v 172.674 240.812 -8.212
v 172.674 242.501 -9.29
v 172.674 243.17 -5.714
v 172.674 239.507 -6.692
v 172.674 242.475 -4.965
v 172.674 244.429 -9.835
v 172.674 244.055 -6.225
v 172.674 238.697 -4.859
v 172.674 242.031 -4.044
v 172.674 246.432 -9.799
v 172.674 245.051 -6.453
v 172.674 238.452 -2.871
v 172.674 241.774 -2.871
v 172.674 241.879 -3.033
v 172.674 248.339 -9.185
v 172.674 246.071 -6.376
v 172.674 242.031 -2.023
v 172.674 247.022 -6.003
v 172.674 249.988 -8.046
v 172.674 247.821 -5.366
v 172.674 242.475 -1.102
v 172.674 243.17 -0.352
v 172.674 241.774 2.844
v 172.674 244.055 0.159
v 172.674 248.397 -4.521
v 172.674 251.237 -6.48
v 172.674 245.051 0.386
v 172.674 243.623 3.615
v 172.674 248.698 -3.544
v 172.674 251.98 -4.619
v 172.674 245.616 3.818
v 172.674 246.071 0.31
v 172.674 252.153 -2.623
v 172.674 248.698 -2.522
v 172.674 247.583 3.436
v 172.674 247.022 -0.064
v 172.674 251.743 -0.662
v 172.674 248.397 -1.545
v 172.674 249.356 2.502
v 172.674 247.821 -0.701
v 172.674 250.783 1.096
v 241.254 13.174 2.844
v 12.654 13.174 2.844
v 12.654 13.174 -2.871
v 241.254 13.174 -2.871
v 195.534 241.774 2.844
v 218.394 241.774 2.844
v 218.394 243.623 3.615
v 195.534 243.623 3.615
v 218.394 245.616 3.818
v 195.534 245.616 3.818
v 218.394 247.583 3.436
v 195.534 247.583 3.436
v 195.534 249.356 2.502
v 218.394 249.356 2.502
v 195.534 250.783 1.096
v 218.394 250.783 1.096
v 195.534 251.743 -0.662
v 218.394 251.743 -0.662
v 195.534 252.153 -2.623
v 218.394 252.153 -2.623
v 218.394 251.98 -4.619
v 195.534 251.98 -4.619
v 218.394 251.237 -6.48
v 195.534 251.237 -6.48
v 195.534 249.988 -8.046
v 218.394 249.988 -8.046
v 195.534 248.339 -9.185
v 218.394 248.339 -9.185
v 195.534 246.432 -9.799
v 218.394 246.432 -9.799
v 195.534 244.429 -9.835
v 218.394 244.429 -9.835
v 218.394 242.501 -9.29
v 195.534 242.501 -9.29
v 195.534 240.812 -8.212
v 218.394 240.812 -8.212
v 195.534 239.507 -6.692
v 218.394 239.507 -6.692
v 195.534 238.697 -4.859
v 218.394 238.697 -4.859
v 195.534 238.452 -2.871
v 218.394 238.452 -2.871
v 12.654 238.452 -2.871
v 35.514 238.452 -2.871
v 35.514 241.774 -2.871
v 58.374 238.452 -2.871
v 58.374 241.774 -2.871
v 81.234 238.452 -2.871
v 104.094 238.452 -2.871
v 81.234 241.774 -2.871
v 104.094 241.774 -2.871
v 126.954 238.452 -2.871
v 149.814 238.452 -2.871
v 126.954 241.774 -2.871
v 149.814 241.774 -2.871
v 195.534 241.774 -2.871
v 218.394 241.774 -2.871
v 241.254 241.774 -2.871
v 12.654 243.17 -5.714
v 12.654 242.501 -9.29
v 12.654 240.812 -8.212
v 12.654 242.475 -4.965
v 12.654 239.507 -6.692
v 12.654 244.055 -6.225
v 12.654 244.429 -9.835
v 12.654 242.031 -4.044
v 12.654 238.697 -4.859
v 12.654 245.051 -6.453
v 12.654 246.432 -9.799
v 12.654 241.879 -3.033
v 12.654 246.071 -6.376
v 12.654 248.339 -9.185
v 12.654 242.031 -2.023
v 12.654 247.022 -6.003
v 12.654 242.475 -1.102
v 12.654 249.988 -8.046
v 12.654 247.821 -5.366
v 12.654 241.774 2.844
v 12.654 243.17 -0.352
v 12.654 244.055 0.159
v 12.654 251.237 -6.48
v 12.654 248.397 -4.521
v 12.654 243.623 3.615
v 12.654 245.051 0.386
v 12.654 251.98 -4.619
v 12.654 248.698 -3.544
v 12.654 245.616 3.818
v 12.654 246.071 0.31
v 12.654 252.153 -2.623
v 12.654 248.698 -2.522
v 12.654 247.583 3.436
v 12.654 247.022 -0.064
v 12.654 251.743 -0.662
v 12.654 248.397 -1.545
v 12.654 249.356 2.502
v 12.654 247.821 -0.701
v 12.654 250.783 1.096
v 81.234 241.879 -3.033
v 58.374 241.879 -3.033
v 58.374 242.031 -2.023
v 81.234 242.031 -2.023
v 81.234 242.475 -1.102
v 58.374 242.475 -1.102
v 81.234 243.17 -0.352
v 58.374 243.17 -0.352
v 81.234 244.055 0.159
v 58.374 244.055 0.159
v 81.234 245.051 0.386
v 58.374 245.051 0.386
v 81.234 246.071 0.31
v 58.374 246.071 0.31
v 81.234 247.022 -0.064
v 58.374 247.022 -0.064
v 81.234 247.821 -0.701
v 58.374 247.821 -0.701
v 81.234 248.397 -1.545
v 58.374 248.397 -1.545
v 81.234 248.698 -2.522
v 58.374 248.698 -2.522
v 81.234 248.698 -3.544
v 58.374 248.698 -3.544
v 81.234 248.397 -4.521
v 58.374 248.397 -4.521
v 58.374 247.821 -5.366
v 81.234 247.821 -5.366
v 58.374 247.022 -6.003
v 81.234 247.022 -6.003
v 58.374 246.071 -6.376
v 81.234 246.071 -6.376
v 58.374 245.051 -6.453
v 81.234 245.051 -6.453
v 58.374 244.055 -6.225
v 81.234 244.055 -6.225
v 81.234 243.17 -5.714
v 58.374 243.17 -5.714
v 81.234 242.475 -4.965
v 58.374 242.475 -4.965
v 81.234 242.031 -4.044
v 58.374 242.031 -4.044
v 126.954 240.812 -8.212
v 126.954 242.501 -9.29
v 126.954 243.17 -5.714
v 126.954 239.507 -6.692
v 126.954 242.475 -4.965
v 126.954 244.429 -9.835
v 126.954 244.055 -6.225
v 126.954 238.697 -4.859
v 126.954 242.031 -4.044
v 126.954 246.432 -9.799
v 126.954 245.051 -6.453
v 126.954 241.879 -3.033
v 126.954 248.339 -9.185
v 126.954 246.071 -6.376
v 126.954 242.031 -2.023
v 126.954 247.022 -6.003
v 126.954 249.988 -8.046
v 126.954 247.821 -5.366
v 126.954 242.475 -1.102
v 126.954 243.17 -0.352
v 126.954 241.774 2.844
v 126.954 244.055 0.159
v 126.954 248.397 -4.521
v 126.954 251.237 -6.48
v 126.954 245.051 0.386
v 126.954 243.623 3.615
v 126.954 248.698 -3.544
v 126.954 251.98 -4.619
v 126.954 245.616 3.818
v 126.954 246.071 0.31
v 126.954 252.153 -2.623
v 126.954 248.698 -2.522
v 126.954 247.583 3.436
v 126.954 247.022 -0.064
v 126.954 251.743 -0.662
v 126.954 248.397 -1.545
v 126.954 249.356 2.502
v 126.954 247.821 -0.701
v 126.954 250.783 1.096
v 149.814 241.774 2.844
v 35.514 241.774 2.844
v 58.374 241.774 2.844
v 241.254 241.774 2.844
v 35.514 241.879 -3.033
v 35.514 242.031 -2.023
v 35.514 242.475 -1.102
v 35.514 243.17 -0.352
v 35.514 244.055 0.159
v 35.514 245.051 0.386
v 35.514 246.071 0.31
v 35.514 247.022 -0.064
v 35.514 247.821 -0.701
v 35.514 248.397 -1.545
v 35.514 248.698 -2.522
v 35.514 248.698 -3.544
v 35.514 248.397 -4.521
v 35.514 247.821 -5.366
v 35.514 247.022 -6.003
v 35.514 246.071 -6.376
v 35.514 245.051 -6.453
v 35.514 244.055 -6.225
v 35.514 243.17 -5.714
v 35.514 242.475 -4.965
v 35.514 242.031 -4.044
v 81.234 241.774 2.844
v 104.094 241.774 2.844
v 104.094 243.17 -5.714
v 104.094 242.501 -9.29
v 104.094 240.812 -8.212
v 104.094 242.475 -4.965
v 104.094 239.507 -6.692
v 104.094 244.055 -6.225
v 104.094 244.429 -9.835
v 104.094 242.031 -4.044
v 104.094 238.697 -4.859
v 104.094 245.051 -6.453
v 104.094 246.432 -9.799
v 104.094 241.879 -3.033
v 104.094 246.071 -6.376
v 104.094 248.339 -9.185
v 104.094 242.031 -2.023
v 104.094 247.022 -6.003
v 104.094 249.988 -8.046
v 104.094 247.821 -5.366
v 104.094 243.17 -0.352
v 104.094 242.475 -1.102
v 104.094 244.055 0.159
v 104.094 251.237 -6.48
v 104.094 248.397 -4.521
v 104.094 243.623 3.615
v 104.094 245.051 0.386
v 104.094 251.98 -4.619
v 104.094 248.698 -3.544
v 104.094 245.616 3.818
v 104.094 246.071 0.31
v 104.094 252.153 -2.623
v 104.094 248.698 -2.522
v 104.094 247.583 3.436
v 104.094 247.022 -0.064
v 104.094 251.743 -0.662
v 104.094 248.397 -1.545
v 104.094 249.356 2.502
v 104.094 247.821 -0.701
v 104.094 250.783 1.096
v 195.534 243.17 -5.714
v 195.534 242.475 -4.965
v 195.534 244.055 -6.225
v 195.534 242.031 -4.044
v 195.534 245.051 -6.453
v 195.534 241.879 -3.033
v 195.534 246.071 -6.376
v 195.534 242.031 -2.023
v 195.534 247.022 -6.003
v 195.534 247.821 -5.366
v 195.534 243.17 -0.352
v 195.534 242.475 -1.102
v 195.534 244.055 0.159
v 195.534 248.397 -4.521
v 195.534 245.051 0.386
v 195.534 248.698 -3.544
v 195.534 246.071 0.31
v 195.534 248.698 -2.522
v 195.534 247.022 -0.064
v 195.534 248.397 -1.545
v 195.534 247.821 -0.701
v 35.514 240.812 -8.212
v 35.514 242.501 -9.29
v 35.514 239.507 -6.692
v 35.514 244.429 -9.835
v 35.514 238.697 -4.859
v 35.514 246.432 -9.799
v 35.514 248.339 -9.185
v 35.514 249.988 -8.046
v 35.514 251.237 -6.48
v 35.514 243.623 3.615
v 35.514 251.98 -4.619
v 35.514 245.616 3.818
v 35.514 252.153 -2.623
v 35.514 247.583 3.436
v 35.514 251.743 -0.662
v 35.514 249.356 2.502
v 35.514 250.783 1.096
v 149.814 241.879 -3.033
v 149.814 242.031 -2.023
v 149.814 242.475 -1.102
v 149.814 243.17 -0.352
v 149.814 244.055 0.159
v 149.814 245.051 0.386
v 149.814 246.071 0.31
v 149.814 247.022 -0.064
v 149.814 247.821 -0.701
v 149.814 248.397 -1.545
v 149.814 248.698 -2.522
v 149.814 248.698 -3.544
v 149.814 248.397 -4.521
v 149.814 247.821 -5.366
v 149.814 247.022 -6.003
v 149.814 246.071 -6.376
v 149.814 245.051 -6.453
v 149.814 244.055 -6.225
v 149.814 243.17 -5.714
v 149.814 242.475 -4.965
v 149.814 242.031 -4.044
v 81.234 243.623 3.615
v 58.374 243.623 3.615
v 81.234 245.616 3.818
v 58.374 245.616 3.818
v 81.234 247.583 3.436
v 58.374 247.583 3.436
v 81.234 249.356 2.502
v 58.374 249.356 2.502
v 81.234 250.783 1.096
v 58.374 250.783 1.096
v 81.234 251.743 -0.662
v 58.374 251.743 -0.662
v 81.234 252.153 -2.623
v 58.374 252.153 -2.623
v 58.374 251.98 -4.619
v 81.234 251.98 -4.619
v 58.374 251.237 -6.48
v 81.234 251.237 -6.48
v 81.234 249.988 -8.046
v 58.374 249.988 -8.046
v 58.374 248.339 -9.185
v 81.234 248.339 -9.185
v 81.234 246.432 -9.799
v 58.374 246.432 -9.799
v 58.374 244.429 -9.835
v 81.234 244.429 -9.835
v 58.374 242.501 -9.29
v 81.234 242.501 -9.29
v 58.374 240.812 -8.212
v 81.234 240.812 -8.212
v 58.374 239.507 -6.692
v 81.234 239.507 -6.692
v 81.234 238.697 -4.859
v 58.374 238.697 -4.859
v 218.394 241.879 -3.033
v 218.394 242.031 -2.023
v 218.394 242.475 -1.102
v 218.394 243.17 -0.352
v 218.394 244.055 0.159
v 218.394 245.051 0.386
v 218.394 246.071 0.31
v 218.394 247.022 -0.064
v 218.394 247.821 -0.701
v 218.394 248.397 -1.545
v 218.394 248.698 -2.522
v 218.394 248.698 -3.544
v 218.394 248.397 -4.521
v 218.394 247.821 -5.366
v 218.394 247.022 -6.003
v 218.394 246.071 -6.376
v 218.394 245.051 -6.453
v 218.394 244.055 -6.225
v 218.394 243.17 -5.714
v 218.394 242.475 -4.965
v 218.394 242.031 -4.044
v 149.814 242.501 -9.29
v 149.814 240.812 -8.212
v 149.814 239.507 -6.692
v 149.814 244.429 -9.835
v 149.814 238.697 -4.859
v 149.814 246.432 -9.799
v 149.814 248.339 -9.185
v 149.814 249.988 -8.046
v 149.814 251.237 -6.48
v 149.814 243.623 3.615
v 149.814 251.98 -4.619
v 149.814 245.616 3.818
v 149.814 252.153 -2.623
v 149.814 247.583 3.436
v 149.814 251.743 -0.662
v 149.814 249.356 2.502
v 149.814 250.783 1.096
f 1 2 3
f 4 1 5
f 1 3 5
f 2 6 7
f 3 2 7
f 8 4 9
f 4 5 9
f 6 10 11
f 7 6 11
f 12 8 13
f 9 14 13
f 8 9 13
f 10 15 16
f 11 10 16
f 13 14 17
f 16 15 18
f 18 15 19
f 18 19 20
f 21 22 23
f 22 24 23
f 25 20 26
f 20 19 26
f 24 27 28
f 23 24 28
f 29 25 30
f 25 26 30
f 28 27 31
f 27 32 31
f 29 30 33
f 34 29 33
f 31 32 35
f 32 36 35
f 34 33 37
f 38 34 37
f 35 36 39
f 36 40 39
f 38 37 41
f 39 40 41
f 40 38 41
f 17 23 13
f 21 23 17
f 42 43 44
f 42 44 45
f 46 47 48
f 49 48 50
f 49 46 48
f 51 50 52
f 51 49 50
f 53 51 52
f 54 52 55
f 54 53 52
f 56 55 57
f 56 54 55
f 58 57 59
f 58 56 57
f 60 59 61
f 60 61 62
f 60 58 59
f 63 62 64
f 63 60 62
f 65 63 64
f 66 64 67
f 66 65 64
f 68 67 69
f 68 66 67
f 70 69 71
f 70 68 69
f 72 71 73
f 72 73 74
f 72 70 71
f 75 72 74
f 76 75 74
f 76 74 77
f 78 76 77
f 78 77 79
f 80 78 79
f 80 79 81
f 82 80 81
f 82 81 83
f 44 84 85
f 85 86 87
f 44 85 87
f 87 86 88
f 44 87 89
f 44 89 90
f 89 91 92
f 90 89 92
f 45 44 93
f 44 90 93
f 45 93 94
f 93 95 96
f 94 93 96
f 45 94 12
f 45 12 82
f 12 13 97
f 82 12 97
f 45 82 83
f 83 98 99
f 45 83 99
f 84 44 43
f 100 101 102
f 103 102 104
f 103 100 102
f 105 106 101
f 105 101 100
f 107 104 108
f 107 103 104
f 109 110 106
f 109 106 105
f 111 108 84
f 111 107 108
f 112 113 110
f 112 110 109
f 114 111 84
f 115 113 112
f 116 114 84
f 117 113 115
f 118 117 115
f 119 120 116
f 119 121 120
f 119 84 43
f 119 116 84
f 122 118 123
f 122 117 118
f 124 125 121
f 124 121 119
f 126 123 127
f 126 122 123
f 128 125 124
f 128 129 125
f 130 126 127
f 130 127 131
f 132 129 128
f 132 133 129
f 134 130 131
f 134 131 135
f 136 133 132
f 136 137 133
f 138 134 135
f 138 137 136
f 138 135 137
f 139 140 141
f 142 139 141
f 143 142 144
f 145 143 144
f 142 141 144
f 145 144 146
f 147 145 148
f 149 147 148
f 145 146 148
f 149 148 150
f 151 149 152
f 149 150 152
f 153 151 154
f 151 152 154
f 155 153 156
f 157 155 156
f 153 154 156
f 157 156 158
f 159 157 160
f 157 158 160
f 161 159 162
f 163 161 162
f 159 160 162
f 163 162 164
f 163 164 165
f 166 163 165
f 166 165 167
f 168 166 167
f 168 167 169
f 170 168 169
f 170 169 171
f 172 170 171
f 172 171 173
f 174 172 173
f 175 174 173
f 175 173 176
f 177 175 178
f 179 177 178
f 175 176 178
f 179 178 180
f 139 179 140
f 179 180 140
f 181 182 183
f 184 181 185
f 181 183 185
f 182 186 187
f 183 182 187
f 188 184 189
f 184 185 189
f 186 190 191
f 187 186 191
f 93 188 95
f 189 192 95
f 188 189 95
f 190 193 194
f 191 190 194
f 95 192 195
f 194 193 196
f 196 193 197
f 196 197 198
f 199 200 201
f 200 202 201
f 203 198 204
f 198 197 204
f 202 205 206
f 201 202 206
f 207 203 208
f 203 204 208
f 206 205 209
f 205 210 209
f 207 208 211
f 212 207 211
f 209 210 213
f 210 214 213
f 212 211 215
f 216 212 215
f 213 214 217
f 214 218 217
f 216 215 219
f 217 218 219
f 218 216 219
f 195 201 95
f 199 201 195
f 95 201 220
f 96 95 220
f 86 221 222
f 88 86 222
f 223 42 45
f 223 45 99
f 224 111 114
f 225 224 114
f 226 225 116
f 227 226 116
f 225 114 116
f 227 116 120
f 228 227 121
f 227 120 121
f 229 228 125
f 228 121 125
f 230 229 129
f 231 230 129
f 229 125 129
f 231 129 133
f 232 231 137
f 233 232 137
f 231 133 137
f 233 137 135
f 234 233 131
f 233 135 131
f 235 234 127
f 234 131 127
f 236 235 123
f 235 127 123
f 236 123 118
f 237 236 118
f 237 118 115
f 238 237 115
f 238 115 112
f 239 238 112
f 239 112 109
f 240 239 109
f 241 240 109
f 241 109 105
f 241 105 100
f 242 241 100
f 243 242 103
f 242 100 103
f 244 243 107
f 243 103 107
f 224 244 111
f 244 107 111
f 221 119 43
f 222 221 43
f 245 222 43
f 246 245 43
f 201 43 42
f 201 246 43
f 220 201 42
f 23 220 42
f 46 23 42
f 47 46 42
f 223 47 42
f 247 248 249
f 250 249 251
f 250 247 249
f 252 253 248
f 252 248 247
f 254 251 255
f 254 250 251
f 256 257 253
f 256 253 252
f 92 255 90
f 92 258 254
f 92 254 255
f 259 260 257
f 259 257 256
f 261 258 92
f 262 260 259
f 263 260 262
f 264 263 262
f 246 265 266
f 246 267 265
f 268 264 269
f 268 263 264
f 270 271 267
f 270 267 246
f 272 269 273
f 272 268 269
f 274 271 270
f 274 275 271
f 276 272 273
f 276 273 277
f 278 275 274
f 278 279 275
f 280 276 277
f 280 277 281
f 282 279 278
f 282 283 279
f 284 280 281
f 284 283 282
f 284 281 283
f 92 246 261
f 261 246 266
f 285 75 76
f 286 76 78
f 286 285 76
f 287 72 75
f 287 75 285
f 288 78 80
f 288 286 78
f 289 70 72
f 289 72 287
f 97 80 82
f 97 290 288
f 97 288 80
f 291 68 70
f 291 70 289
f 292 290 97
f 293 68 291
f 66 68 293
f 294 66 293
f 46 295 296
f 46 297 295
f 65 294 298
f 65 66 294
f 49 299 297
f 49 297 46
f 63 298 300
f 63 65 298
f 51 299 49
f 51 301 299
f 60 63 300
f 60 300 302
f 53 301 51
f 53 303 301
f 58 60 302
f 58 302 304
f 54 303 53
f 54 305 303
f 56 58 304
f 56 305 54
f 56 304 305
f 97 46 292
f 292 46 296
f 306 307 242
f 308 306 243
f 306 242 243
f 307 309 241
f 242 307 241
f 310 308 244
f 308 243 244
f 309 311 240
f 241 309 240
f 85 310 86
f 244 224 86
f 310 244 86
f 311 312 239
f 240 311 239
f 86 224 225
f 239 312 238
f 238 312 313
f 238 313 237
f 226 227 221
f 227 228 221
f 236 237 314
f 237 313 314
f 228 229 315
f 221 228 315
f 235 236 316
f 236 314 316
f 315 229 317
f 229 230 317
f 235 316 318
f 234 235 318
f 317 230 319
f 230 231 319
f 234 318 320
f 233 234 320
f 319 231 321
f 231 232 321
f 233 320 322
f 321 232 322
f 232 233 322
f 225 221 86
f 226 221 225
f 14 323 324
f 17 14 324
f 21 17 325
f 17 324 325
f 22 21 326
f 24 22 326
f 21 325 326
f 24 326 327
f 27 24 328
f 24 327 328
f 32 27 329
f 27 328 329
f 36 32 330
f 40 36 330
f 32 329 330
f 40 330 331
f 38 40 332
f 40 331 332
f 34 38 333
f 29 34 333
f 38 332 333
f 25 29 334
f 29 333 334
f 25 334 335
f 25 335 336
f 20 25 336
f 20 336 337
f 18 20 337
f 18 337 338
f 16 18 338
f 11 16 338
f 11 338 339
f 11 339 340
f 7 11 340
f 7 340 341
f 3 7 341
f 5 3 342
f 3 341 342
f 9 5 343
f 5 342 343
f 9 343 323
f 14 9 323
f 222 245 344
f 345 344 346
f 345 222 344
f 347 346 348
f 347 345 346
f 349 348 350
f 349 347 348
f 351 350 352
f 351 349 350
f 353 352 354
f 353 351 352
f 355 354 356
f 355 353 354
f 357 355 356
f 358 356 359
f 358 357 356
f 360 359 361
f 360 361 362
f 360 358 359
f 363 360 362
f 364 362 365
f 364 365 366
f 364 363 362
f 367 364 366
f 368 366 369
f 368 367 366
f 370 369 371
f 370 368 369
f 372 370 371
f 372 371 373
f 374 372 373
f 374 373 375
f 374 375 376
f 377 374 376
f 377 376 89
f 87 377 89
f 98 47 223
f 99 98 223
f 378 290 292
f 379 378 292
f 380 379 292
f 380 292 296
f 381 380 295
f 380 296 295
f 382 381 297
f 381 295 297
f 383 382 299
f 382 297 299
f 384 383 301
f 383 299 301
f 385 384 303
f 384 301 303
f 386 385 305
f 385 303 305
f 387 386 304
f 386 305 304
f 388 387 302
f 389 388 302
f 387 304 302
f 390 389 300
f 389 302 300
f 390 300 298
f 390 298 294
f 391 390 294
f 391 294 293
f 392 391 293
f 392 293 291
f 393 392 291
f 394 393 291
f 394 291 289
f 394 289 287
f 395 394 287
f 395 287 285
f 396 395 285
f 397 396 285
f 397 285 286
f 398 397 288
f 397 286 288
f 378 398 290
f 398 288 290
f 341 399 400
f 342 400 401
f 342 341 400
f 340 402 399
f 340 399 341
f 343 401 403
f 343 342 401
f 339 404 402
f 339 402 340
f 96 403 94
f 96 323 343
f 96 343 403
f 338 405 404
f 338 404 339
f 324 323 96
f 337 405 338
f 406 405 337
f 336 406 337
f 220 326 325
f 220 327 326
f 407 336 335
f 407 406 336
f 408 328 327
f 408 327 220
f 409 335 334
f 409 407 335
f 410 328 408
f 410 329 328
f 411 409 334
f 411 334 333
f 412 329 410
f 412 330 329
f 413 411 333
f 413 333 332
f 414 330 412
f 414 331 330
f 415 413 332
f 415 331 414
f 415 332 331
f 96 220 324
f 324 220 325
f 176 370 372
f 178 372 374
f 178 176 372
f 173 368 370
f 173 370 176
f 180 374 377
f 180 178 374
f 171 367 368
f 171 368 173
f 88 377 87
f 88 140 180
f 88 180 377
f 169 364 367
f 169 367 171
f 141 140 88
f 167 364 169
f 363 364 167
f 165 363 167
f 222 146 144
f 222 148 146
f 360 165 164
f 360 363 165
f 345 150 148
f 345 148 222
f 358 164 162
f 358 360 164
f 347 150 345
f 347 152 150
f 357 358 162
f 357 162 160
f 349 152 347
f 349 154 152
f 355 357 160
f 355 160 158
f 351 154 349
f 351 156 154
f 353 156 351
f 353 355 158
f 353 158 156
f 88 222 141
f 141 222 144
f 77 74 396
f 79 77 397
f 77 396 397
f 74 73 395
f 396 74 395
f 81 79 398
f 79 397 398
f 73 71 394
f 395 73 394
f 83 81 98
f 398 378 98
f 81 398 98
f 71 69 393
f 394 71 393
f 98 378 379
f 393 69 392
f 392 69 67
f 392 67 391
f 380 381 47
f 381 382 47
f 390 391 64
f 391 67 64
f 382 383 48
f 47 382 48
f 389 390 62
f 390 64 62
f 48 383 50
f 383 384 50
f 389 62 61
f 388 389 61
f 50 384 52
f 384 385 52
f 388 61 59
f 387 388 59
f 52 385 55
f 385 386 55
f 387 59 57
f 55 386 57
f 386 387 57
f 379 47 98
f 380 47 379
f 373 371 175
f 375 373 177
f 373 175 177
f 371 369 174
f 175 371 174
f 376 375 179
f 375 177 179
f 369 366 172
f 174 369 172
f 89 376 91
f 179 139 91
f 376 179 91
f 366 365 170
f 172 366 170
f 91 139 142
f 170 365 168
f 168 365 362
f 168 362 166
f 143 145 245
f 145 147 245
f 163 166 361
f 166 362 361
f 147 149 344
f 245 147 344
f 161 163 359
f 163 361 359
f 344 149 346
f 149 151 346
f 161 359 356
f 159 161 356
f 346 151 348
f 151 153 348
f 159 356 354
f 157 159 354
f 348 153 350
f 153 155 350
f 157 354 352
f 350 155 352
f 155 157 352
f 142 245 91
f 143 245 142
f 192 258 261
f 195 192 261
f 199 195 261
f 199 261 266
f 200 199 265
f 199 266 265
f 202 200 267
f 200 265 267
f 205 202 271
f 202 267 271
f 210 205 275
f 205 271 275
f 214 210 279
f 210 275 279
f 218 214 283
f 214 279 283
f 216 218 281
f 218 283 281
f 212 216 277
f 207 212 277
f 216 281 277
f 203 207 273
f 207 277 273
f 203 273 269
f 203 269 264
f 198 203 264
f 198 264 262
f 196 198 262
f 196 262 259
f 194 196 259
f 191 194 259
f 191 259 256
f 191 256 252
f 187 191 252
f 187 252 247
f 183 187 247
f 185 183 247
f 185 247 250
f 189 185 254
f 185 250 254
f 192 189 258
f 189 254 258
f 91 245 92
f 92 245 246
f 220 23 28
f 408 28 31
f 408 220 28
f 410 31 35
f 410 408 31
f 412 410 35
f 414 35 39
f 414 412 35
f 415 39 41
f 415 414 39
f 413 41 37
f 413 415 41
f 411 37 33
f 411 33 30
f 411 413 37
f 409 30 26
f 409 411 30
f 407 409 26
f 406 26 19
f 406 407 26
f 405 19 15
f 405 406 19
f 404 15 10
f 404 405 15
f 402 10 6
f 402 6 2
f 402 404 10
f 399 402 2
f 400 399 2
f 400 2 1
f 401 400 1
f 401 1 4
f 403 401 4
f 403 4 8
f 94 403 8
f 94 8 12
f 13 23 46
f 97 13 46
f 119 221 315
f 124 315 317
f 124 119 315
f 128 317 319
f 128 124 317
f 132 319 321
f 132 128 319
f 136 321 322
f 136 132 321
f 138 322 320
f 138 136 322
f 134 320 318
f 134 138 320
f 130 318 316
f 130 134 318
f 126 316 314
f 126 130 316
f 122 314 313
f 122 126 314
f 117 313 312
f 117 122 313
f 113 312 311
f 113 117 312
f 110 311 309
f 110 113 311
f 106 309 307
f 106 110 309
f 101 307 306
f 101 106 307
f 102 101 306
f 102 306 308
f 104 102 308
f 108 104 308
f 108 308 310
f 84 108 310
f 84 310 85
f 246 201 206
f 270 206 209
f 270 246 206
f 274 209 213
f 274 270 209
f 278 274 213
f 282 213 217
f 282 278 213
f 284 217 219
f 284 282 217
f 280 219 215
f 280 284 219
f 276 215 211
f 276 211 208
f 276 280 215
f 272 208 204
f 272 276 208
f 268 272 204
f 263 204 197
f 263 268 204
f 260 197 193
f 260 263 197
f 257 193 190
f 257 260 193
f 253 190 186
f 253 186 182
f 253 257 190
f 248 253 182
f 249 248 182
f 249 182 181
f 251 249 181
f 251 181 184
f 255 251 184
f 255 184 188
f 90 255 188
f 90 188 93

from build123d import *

# Parameters (mm, degrees)
SKETCH1_W           = 254
SKETCH1_H           = 254
BOSS_EXTRUDE1_DEPTH = 3.175
SKETCH2_R           = 7.62
SKETCH2_R_2         = 3.81
BOSS_EXTRUDE2_DEPTH = 25.4
LPATTERN1_COUNT     = 5
LPATTERN1_PITCH     = 50.8
SCALE1_SCALE        = 0.9


with BuildPart() as part:
    # Sketch1 → Boss-Extrude1 (new, symmetric)
    with BuildSketch(Plane.XY):
        with Locations((127, 127)):
            Rectangle(SKETCH1_W, SKETCH1_H)
    extrude(amount=BOSS_EXTRUDE1_DEPTH, both=True)

    # Sketch2 → Boss-Extrude2 (add)
    with BuildSketch(Plane.ZY):
        with Locations((-3.35543862, 257.92654701)):
            Circle(SKETCH2_R)
        with Locations(Location((-3.35543862, 257.92654701, 0), (0, 0, 270))):
            Circle(SKETCH2_R_2, mode=Mode.SUBTRACT)
    boss_extrude2 = extrude(amount=-BOSS_EXTRUDE2_DEPTH)

    # LPattern1: Boss-Extrude2 ×5
    with Locations(*[(i * LPATTERN1_PITCH, 0, 0) for i in range(1, LPATTERN1_COUNT)]):
        add(boss_extrude2)


with BuildPart() as part_1:
    # Scale1: scaled about (126.542998423, 131.737903525, -0.133748204)
    add(part.part.scale(SCALE1_SCALE).moved(Location((12.654299842, 13.173790352, -0.01337482))))


solid = part_1.part
